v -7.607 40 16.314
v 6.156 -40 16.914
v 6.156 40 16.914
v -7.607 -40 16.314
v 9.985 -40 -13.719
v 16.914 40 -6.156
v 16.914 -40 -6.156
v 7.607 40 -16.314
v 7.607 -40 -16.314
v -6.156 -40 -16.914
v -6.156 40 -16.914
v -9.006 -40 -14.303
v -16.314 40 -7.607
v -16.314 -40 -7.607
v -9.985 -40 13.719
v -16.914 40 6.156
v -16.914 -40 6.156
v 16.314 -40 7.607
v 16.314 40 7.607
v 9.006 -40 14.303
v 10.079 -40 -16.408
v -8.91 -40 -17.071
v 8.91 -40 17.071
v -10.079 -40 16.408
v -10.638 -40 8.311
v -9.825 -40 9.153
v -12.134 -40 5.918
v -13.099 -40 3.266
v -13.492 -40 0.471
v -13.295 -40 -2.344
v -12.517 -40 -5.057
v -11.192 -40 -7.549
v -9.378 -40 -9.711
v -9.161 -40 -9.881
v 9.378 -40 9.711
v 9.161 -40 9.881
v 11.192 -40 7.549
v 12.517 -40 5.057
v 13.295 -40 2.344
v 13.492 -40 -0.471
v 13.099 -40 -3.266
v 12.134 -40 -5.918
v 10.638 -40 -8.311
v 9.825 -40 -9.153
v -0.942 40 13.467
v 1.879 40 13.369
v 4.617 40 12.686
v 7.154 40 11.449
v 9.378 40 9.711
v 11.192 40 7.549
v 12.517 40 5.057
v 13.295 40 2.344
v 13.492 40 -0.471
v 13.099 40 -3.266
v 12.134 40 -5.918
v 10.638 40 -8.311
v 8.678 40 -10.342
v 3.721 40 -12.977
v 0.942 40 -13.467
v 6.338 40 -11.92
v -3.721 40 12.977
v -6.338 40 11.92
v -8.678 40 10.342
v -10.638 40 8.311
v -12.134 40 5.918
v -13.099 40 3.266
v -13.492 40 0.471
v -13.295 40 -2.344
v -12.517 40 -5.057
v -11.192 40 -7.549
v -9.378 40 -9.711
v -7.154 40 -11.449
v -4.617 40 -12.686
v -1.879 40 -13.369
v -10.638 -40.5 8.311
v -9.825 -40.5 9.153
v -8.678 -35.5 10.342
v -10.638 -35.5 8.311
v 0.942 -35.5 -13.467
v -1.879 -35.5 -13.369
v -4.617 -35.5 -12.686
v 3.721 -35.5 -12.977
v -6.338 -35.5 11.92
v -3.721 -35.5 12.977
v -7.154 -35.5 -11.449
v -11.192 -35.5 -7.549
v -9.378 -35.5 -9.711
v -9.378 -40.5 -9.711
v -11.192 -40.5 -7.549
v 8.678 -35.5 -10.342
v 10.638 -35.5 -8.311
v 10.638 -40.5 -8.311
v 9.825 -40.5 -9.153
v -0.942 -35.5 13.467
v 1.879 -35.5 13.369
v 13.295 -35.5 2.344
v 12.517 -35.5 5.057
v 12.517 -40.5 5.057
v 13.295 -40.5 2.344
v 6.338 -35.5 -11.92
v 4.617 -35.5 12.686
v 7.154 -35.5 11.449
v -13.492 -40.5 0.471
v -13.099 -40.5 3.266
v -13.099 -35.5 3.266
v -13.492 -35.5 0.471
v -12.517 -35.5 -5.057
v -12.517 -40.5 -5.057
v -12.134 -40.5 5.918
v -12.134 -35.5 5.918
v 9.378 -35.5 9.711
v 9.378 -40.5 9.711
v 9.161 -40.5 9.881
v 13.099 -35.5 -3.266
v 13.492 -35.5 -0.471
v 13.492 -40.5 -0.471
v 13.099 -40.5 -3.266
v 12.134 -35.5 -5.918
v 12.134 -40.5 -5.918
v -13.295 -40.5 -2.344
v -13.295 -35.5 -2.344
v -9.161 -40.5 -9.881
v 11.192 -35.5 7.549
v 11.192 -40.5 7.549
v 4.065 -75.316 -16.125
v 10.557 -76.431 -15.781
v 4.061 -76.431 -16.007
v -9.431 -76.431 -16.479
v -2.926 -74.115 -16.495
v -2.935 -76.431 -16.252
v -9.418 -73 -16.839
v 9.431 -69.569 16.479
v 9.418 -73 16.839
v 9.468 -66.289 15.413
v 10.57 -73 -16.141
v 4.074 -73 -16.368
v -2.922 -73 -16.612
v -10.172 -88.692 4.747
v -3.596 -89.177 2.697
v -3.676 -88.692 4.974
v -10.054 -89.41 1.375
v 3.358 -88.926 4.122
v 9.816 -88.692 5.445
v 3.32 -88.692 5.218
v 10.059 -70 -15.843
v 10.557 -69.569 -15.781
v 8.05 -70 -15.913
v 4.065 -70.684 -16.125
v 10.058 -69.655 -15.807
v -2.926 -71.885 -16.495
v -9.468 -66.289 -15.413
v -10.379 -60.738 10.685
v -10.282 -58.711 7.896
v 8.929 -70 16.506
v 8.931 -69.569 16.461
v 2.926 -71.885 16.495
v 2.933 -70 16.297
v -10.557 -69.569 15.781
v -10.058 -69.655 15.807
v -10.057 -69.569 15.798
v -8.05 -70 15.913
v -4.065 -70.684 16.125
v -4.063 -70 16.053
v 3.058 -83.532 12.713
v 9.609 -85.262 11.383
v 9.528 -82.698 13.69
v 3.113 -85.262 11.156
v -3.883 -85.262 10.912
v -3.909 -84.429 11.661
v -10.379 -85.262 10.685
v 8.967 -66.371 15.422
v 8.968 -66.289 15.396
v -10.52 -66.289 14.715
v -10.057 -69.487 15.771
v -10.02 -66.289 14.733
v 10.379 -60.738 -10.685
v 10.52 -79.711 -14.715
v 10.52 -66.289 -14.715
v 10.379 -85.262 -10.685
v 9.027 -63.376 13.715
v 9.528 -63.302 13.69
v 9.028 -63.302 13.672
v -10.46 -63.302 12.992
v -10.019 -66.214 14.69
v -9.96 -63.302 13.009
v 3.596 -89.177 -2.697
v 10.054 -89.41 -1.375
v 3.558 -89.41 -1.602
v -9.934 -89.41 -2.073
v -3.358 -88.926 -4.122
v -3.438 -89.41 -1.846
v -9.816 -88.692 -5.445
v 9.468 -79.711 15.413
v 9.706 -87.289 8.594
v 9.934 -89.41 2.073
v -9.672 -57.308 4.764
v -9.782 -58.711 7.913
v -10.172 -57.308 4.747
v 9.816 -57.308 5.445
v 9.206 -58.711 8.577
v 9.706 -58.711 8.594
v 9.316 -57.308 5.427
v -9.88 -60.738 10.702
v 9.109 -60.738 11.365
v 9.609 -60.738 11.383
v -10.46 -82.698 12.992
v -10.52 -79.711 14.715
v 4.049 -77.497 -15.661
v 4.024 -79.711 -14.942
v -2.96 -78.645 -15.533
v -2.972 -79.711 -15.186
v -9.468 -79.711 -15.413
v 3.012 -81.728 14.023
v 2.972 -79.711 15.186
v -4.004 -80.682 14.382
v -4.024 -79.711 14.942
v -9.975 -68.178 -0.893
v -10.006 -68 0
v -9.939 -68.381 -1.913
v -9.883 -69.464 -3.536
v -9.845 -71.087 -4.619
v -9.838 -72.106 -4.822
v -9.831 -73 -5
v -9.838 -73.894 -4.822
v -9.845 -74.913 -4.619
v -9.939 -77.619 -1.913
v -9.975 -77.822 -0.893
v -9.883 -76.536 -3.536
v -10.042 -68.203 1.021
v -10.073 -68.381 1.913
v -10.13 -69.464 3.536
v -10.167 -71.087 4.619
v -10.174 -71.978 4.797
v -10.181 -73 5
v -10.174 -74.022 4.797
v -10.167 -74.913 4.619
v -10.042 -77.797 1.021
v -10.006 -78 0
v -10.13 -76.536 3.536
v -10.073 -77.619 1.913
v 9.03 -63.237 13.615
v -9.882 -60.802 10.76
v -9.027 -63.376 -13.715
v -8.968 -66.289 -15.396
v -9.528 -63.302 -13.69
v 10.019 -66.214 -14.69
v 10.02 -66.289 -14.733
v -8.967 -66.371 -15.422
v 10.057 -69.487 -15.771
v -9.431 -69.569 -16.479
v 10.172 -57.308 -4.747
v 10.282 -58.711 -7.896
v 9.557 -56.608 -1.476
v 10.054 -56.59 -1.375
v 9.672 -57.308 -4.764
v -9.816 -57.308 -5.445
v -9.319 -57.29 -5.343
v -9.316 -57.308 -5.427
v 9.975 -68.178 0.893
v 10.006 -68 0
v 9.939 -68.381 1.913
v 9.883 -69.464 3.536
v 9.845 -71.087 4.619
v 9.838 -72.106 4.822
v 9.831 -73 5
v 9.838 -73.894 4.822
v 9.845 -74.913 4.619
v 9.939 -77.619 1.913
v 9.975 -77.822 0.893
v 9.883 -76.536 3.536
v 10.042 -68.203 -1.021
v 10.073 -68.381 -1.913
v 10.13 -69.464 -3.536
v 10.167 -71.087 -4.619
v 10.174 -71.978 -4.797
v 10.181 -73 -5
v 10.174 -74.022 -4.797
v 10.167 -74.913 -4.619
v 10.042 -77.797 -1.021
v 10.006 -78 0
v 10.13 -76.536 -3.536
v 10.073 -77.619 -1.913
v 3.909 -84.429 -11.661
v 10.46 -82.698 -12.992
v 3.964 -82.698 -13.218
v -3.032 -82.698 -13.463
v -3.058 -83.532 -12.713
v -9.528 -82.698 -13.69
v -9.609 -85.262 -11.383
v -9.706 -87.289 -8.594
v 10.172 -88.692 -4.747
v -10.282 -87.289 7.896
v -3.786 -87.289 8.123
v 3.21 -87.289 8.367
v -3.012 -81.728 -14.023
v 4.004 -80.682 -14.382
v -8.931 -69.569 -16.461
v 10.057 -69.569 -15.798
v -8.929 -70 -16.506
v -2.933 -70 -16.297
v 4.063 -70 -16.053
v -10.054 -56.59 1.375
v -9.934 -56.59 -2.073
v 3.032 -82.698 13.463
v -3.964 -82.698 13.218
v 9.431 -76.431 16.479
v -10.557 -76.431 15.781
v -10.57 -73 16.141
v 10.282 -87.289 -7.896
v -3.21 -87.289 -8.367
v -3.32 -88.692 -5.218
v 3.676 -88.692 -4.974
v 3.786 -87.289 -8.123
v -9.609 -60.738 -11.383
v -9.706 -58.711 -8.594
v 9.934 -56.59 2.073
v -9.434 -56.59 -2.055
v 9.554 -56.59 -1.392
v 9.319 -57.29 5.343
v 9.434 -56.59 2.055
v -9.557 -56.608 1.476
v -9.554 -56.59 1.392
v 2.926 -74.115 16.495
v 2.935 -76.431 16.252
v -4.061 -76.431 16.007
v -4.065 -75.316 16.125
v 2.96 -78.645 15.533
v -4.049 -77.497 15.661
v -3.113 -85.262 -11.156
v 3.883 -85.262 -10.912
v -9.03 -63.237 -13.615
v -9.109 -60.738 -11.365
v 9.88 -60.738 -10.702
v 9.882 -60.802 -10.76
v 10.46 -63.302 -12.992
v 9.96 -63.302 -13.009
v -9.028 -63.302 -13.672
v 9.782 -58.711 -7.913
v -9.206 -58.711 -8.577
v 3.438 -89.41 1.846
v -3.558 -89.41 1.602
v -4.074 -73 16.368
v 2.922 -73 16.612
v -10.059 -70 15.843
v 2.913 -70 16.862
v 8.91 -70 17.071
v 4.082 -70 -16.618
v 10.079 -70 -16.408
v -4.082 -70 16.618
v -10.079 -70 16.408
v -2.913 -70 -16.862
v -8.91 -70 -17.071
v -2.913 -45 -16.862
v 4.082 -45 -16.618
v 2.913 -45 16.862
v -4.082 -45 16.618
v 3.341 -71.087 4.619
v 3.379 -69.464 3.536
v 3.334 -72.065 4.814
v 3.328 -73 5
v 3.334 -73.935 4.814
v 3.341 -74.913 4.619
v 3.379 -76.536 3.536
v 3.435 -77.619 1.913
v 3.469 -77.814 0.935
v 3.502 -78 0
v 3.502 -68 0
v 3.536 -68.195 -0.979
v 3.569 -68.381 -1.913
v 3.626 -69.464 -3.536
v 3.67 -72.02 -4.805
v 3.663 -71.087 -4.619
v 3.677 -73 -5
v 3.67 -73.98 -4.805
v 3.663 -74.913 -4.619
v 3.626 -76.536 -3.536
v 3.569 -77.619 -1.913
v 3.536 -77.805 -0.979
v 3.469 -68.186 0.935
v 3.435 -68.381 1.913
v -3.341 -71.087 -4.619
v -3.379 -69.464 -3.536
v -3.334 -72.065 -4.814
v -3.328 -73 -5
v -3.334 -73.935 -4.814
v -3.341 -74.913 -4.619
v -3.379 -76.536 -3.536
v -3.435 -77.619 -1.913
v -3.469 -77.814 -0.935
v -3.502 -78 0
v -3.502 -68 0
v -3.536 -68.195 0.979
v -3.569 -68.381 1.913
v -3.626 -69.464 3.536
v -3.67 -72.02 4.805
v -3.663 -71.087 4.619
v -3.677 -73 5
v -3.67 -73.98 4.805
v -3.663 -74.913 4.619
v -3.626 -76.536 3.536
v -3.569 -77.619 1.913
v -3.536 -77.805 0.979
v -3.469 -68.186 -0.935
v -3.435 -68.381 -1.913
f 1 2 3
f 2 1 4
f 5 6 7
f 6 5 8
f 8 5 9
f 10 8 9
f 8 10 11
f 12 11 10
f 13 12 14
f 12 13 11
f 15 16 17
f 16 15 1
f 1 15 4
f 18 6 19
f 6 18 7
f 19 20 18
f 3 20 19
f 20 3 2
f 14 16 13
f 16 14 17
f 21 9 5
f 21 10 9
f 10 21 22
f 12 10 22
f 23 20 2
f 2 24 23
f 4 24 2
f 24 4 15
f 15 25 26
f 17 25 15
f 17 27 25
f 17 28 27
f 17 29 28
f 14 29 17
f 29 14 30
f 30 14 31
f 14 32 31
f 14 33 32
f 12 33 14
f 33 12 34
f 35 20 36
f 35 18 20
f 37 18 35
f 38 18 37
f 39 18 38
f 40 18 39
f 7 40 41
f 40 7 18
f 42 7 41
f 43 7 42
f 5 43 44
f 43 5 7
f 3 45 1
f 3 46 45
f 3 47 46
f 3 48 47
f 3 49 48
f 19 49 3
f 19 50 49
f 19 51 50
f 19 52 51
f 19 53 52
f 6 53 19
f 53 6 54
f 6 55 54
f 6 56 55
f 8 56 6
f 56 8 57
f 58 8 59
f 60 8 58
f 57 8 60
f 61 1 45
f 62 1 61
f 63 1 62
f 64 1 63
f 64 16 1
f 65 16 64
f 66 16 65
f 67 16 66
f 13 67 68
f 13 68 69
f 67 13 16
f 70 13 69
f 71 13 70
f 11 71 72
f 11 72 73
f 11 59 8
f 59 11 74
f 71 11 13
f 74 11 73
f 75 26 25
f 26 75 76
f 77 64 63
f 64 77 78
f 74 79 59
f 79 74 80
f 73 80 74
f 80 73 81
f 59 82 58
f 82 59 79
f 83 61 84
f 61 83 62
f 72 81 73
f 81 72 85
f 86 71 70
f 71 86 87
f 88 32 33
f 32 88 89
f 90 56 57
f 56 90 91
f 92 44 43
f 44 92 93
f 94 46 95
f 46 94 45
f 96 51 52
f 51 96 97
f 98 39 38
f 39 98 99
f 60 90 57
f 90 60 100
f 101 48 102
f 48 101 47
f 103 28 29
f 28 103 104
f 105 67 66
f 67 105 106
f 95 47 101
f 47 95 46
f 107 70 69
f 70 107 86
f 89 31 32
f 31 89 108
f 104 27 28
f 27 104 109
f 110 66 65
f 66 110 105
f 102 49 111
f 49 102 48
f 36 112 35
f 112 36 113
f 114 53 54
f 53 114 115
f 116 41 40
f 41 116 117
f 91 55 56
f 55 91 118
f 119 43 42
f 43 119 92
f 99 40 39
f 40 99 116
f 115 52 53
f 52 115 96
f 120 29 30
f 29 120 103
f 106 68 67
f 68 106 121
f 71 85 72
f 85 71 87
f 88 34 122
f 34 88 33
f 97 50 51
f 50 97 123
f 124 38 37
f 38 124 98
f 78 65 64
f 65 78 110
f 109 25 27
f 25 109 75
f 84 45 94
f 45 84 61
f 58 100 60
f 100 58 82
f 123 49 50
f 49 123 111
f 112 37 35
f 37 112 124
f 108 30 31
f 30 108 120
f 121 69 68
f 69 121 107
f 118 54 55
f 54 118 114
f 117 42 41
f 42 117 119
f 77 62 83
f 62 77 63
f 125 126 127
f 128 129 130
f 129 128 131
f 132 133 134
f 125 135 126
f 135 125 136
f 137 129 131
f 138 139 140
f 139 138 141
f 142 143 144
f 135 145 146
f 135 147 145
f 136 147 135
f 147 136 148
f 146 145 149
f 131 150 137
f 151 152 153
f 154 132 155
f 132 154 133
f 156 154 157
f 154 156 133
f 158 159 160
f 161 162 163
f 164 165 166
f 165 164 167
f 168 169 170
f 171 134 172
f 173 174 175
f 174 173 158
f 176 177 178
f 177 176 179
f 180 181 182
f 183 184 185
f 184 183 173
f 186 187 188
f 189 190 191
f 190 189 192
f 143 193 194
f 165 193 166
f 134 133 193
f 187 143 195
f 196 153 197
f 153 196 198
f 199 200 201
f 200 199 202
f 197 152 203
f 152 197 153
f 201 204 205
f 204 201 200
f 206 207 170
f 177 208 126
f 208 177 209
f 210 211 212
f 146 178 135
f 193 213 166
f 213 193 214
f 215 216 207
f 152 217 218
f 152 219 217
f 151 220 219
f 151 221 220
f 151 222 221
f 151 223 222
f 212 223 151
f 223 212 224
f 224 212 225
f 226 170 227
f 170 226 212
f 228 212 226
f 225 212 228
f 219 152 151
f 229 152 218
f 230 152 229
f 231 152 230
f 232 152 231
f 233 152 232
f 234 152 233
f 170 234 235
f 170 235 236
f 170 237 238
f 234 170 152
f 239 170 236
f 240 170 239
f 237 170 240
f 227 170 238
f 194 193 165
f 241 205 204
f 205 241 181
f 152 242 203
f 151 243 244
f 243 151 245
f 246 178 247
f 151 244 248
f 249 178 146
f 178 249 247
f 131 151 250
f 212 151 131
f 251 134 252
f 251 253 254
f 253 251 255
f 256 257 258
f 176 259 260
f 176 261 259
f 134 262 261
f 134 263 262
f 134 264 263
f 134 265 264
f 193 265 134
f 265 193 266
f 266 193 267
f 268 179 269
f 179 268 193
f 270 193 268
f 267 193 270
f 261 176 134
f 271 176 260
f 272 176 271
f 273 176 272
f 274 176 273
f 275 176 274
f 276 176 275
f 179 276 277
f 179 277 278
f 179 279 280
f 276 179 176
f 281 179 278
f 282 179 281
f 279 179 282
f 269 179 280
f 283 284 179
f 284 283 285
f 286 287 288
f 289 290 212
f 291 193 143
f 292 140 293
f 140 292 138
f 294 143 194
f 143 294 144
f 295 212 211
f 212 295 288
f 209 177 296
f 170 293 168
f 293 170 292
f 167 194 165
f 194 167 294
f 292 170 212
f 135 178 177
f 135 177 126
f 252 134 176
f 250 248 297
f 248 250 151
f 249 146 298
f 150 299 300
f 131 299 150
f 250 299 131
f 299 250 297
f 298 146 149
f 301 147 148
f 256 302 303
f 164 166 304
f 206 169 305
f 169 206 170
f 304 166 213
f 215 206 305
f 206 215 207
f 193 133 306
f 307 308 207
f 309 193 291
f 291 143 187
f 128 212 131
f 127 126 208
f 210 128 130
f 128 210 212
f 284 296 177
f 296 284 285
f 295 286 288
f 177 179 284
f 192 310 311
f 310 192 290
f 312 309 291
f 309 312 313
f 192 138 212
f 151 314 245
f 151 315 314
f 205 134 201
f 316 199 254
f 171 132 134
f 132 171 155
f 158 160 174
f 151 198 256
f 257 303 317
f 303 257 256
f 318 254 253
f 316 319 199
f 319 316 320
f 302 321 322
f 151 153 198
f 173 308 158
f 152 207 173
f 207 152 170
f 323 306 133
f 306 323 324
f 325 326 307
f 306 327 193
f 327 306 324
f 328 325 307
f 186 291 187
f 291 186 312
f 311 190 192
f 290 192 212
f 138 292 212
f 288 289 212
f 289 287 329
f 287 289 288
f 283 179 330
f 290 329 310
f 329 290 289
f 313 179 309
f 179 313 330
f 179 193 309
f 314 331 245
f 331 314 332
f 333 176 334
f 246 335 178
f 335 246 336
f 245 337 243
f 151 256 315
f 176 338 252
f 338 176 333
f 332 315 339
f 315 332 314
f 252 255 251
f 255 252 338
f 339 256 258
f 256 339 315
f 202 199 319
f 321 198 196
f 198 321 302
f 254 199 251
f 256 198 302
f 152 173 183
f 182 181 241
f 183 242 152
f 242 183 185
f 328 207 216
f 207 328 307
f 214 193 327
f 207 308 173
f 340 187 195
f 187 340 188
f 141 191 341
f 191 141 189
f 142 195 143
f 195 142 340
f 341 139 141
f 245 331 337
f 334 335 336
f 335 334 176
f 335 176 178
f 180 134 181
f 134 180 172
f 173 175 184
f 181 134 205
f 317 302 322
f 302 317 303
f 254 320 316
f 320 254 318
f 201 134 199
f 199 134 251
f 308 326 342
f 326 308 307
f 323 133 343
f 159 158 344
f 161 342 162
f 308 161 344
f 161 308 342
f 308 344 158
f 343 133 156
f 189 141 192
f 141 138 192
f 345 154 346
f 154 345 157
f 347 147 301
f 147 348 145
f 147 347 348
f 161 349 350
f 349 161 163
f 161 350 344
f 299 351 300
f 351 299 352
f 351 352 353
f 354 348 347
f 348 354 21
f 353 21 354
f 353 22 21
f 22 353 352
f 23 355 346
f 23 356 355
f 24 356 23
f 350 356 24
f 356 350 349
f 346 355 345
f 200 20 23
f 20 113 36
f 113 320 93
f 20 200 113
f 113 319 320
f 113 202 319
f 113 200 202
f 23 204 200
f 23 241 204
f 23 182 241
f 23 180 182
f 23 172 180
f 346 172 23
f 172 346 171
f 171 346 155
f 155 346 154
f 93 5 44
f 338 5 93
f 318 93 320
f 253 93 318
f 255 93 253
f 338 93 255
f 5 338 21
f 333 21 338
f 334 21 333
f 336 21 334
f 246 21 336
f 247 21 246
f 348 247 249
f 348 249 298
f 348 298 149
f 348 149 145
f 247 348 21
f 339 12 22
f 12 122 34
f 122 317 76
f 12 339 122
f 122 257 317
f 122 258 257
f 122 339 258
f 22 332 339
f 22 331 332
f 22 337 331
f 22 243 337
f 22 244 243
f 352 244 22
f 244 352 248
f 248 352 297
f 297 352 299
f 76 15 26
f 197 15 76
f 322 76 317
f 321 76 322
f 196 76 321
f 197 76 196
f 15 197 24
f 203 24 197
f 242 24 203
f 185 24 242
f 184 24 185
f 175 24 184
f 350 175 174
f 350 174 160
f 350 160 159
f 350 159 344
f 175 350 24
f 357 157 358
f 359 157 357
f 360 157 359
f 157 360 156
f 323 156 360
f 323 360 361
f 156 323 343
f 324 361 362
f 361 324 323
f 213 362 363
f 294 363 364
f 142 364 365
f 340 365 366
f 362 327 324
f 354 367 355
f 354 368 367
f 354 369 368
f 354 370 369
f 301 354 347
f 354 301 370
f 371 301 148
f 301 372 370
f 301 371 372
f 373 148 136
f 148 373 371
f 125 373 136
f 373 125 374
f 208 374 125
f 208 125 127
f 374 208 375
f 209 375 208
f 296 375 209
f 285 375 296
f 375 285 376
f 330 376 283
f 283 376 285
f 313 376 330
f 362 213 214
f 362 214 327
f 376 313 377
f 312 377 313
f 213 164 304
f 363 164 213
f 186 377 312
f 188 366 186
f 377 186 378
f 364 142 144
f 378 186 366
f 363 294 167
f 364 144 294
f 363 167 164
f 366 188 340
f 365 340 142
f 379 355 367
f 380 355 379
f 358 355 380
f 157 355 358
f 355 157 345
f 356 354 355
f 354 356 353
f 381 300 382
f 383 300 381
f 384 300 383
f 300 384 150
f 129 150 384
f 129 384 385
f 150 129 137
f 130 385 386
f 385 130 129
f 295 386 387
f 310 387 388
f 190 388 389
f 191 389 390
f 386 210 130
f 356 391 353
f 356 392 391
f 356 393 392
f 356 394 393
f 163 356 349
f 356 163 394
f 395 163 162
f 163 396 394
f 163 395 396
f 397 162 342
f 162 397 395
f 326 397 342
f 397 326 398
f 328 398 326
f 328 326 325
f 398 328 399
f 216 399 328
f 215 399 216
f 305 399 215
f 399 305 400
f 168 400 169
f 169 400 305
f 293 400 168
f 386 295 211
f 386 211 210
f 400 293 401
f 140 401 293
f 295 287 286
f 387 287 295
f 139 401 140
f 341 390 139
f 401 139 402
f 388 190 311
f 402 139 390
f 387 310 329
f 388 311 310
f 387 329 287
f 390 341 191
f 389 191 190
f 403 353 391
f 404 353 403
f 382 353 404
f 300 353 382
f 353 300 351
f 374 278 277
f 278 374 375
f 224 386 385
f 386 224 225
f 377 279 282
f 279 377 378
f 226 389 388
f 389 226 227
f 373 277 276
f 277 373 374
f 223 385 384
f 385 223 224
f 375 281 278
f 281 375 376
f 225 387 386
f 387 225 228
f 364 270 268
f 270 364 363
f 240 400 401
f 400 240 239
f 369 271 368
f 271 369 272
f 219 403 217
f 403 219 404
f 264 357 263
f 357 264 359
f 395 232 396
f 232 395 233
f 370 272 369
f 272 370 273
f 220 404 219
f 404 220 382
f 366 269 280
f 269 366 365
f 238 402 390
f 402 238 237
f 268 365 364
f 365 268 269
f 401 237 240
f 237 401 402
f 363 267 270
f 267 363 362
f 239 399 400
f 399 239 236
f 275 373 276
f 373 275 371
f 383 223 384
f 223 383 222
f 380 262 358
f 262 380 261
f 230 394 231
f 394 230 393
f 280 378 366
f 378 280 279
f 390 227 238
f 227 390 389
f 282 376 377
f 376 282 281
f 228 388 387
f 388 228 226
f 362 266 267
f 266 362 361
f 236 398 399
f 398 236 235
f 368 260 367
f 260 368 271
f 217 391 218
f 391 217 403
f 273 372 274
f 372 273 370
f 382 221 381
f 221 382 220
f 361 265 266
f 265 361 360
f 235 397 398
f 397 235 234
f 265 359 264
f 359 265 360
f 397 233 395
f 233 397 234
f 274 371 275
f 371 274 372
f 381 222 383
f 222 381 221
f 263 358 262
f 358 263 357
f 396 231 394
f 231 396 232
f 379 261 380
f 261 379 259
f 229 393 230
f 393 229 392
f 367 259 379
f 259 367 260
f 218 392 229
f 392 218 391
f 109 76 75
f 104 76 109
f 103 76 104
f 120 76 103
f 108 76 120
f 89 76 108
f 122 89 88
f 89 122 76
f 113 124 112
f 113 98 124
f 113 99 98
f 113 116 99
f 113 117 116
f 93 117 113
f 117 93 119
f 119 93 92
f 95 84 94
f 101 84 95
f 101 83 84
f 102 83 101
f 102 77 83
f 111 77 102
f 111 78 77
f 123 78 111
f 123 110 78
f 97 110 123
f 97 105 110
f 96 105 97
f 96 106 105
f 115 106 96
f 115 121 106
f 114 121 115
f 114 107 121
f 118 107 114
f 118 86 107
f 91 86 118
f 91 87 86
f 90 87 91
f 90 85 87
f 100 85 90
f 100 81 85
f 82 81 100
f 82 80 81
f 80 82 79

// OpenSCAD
rotate([90,110,0])
{

union(){
// pricteni pro zesileni podku
difference(){
 

difference(){
// odecteni stredu pro zasazeni
union (){
//pricteni pulvalce

union(){
// pricteni pulvalce

difference() {
//odecet vnitrku 6 uhelniku


union() {
// union pro zakladni 6 uhelnik pro nasazeni na tyc

translate([0,0,-40]) rotate([0,0,0]) cylinder(h=80,r=18,$fn=8);

}

cylinder(h = 80, r = 13.5, center = true);
//odecet vnitrku 6 uhelniku
}
//#translate([0,0,0])  rotate([90,0,0]) cylinder(h = 400, r = 20, center = false);

}
//////////////////
//union(){

#translate([0,0,73]) rotate ([90,0,22])cylinder(h = 20, r=16.5, center = true);
// kruh pro osazeni do civky

//translate([0,0,0]) rotate ([0,0,0]) cube(size = [70,70,70], center = true);




#translate([0,0,55]) rotate ([0,0,22]) cube(size = [33.5,19,30], center = true);
}
// pricteni krychle pro vysunuti pulkruhu
translate([0,0,90]) rotate ([0,0,22]) cube(size = [90,7,90], center = true);
// 7 je sirka mezery pro stlaceni
}

#translate([0,0,73]) rotate ([90,0,20])cylinder(h =300 , r=5, center = true);
}
#translate([0,0,38]) rotate ([0,0,0])cylinder(h = 5, r = 13.5, center = true);
// pricteni pro zesileni podku


}
}
// #
